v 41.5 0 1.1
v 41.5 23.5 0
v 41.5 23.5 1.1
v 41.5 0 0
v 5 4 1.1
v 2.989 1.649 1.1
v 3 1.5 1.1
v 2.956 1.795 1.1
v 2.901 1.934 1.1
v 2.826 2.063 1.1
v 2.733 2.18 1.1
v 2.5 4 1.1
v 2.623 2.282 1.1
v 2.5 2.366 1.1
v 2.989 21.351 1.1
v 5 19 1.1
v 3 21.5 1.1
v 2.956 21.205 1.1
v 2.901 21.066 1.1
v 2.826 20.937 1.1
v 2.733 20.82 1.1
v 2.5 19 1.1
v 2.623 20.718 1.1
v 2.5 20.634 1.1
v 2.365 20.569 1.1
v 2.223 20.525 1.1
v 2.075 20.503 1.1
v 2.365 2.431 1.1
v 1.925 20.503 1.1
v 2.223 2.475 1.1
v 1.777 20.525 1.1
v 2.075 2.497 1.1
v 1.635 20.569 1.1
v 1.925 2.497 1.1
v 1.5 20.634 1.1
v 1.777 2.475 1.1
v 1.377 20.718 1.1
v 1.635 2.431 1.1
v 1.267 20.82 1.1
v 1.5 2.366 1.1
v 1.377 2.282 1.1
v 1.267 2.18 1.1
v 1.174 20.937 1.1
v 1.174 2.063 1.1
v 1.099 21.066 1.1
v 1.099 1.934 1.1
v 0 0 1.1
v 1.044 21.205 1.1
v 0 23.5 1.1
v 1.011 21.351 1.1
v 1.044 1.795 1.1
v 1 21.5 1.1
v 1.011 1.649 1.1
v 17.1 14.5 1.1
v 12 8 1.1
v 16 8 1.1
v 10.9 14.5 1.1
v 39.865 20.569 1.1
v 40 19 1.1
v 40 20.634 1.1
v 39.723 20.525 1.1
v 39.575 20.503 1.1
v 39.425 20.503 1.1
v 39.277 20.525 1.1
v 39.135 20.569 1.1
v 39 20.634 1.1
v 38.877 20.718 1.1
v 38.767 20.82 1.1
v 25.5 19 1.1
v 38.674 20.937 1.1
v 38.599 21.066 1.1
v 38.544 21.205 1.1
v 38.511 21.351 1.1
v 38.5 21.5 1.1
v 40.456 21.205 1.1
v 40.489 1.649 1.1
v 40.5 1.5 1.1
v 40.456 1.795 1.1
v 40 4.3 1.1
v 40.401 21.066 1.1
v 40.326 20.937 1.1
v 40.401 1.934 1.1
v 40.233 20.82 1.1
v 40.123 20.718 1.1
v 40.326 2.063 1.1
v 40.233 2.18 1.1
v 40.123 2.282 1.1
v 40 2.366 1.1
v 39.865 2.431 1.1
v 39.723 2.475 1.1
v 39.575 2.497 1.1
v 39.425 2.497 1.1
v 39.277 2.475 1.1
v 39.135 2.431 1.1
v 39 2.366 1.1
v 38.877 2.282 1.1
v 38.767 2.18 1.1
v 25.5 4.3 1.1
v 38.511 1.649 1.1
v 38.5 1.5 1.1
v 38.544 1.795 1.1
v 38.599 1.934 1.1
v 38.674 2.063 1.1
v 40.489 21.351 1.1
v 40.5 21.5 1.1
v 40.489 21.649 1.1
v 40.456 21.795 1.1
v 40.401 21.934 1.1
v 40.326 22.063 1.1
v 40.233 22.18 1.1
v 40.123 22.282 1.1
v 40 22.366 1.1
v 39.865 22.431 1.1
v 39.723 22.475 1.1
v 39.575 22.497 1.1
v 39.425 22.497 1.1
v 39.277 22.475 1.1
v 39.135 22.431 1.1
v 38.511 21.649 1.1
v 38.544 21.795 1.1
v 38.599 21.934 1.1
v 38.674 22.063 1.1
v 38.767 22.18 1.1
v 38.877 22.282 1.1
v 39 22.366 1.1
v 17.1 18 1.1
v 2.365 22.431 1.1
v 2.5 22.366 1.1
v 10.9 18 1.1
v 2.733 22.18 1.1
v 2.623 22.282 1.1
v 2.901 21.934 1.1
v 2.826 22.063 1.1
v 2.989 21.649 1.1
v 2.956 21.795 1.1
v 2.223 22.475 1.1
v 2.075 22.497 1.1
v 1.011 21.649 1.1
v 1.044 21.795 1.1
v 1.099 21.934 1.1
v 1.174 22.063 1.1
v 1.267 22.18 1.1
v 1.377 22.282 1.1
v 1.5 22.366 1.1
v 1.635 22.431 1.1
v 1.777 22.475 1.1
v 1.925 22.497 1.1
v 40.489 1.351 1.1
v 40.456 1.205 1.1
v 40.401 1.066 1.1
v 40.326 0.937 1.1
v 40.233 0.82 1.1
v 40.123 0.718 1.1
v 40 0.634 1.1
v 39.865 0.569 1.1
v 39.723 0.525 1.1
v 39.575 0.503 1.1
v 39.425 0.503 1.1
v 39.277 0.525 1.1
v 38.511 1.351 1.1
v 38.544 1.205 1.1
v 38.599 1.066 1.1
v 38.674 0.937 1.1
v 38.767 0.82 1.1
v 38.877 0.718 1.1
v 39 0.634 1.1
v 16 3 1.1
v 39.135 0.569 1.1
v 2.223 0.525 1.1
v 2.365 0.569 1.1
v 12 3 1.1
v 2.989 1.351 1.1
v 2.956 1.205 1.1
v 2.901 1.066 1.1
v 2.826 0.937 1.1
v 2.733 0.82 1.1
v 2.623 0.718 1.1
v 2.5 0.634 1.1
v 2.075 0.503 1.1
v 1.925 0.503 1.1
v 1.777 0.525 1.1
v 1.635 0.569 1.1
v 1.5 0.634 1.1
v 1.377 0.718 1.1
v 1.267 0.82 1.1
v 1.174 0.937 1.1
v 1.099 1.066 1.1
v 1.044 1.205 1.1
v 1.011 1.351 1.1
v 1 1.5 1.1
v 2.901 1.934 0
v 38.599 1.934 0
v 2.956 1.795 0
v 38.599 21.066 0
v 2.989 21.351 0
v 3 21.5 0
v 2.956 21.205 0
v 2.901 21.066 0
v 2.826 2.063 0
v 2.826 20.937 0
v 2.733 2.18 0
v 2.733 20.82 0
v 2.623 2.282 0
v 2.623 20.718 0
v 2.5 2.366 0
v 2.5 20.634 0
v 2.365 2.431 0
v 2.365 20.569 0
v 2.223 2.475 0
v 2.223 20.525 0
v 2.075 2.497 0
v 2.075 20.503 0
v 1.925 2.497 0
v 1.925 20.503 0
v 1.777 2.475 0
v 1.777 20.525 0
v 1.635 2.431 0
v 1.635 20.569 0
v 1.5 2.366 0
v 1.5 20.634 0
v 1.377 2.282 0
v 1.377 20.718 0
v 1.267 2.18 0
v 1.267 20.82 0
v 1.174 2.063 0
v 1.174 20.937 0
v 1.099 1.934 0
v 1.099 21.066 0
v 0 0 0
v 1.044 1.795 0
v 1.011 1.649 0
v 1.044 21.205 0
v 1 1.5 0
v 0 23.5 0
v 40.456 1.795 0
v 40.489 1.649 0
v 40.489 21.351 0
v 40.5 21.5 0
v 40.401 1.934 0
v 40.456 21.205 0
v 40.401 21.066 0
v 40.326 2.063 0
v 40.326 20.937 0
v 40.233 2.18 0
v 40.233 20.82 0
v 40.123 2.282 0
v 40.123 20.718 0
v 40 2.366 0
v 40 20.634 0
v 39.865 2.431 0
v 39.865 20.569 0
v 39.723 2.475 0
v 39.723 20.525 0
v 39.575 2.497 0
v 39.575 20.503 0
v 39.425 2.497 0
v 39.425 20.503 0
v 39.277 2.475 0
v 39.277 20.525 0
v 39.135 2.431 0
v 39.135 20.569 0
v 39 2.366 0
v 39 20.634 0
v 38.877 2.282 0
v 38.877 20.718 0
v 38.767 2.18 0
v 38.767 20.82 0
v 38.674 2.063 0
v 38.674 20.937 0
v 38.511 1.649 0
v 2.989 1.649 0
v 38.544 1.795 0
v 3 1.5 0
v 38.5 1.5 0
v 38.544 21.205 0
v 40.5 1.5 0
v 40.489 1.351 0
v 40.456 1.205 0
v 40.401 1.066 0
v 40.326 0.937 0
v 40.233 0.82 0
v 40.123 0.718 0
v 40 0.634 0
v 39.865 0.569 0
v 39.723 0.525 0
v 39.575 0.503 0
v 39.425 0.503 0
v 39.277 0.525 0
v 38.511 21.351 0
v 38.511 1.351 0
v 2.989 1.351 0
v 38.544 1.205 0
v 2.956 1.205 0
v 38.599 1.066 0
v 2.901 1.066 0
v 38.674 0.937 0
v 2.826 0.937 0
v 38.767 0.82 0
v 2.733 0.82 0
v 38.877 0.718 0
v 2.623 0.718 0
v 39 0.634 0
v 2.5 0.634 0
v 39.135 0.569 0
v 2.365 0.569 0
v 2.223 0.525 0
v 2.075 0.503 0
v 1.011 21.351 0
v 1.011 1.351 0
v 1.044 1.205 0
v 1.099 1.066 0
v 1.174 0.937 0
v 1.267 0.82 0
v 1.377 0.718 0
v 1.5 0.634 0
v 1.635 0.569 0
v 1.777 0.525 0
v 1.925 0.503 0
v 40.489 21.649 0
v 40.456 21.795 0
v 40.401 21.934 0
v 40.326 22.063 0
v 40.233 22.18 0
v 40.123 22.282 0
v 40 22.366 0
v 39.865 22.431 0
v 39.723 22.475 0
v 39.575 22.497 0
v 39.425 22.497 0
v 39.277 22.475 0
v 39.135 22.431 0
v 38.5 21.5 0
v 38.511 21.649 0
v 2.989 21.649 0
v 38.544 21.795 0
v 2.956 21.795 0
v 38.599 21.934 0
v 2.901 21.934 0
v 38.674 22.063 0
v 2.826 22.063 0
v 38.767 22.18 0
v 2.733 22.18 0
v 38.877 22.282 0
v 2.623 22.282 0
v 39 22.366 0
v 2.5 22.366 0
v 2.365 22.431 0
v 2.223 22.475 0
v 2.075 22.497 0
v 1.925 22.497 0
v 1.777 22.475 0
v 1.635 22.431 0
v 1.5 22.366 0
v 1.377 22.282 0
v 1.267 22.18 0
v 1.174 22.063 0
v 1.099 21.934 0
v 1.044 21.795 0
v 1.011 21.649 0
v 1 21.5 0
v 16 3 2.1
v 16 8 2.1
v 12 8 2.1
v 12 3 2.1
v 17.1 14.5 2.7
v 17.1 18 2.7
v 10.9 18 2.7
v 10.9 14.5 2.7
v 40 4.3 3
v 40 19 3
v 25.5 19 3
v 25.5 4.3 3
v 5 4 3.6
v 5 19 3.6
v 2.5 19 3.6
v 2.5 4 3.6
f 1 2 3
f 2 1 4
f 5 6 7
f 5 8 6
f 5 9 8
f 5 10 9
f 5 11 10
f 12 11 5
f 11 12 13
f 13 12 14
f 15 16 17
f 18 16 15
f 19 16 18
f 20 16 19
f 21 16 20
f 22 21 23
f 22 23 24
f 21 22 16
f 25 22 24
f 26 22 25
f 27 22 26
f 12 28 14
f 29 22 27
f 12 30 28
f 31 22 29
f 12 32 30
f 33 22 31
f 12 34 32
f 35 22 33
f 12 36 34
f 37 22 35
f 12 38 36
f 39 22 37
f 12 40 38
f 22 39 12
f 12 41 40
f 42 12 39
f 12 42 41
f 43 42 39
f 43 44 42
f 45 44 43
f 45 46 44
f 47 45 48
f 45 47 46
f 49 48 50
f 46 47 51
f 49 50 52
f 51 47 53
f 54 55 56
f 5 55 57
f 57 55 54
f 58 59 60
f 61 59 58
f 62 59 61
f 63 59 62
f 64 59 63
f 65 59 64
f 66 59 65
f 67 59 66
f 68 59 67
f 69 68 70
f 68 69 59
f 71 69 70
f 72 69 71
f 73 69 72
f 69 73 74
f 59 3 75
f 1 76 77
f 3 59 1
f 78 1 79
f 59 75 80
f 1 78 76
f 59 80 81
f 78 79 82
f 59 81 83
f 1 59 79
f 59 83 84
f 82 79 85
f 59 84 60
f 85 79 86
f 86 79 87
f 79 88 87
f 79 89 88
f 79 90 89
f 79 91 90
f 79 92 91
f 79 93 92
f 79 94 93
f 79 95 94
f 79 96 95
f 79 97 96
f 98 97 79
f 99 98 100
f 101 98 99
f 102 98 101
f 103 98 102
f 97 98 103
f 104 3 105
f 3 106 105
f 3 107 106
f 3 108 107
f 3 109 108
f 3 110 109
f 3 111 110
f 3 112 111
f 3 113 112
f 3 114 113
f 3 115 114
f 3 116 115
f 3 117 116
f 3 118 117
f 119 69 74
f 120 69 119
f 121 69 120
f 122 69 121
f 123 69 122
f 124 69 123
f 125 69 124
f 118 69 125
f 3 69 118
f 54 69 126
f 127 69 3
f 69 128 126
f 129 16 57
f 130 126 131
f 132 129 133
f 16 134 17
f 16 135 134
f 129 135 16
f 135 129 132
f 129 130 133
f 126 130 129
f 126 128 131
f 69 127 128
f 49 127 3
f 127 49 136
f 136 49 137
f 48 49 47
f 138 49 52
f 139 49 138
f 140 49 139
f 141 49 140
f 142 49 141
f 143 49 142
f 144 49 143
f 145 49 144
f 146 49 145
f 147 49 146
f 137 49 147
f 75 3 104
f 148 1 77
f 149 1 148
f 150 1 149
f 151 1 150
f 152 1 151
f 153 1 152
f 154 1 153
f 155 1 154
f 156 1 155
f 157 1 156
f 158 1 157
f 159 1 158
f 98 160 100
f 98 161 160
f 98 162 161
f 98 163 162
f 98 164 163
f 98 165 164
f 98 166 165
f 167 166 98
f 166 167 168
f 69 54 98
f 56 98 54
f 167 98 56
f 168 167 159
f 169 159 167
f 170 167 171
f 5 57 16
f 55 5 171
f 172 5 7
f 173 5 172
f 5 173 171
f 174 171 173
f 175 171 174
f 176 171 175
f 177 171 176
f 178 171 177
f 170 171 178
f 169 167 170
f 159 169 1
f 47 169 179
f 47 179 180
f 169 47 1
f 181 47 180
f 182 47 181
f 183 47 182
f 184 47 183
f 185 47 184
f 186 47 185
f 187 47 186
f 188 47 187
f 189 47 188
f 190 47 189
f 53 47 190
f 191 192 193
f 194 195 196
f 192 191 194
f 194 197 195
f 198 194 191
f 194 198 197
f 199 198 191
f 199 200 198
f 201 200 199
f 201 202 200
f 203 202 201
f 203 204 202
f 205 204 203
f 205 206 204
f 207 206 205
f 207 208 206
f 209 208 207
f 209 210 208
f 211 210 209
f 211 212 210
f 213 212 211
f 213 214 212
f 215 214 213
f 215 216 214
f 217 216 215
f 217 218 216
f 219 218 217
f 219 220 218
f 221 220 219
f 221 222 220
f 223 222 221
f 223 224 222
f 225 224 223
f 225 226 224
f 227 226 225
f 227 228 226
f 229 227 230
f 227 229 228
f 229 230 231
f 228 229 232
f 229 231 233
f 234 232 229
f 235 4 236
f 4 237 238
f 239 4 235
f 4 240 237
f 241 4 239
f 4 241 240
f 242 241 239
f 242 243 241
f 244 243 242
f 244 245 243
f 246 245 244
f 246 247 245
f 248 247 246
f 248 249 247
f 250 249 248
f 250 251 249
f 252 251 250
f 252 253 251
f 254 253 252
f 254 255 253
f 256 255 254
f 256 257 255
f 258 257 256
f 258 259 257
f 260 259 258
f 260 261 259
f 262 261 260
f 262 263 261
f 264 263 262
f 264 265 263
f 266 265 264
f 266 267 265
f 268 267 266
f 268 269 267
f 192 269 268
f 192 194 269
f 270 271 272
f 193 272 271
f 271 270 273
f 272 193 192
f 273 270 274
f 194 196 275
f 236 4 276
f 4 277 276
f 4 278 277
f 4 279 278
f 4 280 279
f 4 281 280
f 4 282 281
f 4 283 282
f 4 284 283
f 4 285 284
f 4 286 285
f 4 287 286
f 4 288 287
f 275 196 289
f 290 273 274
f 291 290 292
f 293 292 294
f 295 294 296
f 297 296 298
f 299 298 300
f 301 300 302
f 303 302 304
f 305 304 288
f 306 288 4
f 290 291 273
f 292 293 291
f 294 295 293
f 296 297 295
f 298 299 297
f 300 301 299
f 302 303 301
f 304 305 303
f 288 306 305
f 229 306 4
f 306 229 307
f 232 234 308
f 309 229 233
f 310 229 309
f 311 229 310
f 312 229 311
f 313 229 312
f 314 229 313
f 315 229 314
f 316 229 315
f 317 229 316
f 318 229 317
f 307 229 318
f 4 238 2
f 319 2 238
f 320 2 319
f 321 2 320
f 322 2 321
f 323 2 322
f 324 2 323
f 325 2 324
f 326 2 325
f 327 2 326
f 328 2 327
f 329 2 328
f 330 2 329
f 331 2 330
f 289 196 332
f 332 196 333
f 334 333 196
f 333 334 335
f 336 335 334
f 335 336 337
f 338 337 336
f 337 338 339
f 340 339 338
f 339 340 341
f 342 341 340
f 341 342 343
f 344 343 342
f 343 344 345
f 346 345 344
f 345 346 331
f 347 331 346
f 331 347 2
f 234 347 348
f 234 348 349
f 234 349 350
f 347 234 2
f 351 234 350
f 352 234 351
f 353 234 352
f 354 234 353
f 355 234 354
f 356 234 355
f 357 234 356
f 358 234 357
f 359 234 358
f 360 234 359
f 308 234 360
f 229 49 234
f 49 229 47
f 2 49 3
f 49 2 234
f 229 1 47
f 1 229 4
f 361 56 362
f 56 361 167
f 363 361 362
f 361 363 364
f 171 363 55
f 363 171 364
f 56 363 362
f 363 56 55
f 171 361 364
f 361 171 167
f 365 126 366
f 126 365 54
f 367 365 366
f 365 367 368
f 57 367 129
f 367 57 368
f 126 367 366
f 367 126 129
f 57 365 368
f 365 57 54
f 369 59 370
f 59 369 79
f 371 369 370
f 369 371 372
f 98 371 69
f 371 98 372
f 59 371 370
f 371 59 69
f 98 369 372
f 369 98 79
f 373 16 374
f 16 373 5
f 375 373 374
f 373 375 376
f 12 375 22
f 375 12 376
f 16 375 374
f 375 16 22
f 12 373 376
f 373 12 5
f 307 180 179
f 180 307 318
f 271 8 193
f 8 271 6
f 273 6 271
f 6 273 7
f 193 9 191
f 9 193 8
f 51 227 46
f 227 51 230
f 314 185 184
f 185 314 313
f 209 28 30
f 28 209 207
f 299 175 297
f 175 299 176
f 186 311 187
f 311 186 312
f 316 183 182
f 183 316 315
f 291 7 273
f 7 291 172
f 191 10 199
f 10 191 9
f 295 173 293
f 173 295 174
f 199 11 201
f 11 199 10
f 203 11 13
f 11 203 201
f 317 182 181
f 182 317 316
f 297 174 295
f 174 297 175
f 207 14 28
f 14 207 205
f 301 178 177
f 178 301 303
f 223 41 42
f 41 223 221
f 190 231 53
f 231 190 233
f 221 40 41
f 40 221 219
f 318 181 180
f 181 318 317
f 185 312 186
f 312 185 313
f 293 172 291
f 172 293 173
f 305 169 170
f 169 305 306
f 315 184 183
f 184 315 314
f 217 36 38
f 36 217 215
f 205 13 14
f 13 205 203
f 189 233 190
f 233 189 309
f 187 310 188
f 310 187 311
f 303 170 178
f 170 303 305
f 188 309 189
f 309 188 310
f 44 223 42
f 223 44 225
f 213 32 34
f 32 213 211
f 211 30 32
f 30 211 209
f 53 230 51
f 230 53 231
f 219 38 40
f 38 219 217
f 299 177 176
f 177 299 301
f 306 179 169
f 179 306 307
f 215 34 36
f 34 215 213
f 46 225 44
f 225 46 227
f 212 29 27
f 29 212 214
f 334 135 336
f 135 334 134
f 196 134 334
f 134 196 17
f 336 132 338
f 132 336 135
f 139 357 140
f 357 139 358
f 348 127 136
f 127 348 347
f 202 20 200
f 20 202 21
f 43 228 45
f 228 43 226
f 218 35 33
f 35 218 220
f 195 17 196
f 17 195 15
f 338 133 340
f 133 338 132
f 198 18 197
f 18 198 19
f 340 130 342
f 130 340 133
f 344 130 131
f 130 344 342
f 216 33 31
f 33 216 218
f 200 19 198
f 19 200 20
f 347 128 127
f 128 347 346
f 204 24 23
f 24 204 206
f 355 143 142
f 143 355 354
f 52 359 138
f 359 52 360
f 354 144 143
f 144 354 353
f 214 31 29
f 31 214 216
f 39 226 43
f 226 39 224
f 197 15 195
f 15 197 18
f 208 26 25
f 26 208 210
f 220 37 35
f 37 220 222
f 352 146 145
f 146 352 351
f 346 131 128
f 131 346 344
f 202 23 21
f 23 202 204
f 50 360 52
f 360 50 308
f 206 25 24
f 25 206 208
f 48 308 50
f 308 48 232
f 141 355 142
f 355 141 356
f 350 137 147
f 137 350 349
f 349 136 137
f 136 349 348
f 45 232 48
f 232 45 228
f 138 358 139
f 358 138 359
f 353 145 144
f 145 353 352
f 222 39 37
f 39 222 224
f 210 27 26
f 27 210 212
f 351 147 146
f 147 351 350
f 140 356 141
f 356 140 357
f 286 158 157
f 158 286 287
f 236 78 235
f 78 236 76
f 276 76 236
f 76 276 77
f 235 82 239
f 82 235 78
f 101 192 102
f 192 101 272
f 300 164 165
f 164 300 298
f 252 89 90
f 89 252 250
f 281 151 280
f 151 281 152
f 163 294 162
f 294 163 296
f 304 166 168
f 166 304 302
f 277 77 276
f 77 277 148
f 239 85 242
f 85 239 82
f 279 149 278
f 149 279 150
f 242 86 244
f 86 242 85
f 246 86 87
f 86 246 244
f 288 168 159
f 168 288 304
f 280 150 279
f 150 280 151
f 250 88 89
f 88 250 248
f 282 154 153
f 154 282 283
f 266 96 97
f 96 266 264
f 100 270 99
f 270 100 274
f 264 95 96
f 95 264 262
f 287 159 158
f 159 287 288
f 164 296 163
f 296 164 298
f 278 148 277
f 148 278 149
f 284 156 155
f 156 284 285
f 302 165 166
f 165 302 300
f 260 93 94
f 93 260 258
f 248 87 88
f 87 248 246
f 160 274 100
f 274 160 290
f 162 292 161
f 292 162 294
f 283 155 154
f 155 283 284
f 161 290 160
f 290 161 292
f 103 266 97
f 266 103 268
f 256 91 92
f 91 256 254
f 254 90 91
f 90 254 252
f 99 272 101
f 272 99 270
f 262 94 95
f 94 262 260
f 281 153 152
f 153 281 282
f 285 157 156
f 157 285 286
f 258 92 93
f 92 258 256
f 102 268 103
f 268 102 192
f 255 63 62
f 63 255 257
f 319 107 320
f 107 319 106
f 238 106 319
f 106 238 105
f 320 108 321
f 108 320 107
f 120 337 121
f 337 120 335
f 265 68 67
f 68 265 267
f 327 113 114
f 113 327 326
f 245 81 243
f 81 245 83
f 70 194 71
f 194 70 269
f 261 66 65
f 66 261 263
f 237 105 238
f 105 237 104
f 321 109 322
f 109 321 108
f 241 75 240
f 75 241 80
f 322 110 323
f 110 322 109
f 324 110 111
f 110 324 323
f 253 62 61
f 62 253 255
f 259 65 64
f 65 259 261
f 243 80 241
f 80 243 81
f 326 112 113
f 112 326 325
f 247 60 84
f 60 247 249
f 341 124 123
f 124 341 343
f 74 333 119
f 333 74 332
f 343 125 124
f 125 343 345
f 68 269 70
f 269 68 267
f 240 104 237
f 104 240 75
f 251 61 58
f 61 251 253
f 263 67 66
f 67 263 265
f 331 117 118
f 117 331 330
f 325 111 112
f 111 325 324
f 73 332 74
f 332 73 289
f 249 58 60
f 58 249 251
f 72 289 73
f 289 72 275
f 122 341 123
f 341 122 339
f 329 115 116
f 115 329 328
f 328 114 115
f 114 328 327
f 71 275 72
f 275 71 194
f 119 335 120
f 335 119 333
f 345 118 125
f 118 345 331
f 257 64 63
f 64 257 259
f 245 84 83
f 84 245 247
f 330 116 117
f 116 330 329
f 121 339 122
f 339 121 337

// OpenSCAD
$fn = 42;

difference(){
	union() {
		union() {
			union() {
				union() {
					union() {
						union() {
							union() {
								union() {
									cube(size = [41.5000000000, 23.5000000000, 1.1000000000]);
									translate(v = [2, 0, 0]) {
										translate(v = [0, 1.5000000000, 0]) {
											translate(v = [0, 0, -20]) {
											}
										}
									}
								}
								translate(v = [2, 0, 0]) {
									translate(v = [0, 21.5000000000, 0]) {
										translate(v = [0, 0, -20]) {
										}
									}
								}
							}
							translate(v = [39.5000000000, 0, 0]) {
								translate(v = [0, 1.5000000000, 0]) {
									translate(v = [0, 0, -20]) {
									}
								}
							}
						}
						translate(v = [39.5000000000, 0, 0]) {
							translate(v = [0, 21.5000000000, 0]) {
								translate(v = [0, 0, -20]) {
								}
							}
						}
					}
					translate(v = [0, 3, 0]) {
						translate(v = [12, 0, 0]) {
							translate(v = [0, 0, 1.1000000000]) {
								cube(size = [4, 5, 1]);
							}
						}
					}
				}
				translate(v = [0, 14.5000000000, 0]) {
					translate(v = [10.9000000000, 0, 0]) {
						translate(v = [0, 0, 1.1000000000]) {
							cube(size = [6.2000000000, 3.5000000000, 1.6000000000]);
						}
					}
				}
			}
			translate(v = [0, 0, 1.1000000000]) {
				translate(v = [0, 4.3000000000, 0]) {
					translate(v = [25.5000000000, 0, 0]) {
						cube(size = [14.5000000000, 14.7000000000, 1.9000000000]);
					}
				}
			}
		}
		translate(v = [0, 4, 0]) {
			translate(v = [2.5000000000, 0, 0]) {
				translate(v = [0, 0, 1.1000000000]) {
					cube(size = [2.5000000000, 15, 2.5000000000]);
				}
			}
		}
	}
	/* Holes Below*/
	union(){
		union(){
			union(){
				union(){
					union(){
						union(){
							union(){
								union(){
									translate(v = [2, 0, 0]){
										translate(v = [0, 1.5000000000, 0]){
											translate(v = [0, 0, -20]){
												cylinder(d = 2, h = 50);
											}
										}
									}
								}
								translate(v = [2, 0, 0]){
									translate(v = [0, 21.5000000000, 0]){
										translate(v = [0, 0, -20]){
											cylinder(d = 2, h = 50);
										}
									}
								}
							}
							translate(v = [39.5000000000, 0, 0]){
								translate(v = [0, 1.5000000000, 0]){
									translate(v = [0, 0, -20]){
										cylinder(d = 2, h = 50);
									}
								}
							}
						}
						translate(v = [39.5000000000, 0, 0]){
							translate(v = [0, 21.5000000000, 0]){
								translate(v = [0, 0, -20]){
									cylinder(d = 2, h = 50);
								}
							}
						}
					}
				}
			}
		}
	} /* End Holes */ 
}
/***********************************************
*********      SolidPython code:      **********
************************************************
 
from os.path import join
from solid.utils import *

SEGMENTS = 42
HAS_PINS = True
PINS_BACKSIDE = False


def assemble():
    print "assembling"
    base = cube([41.5, 23.5, 1.1])

    print "punching holes"
    _cylinder_hole = down(20)(hole()(cylinder(d=2, h=50)))
    base += right(2)(forward(1.5)(_cylinder_hole))
    base += right(2)(forward(21.5)(_cylinder_hole))
    base += right(39.5)(forward(1.5)(_cylinder_hole))
    base += right(39.5)(forward(21.5)(_cylinder_hole))

    print "attaching chips"
    _cube_chip1 = forward(3)(right(12)(up(1.1)(cube([4, 5, 1]))))
    _cube_chip2 = forward(14.5)(right(10.9)(up(1.1)(cube([6.2, 3.5, 1.6]))))
    base += _cube_chip1
    base += _cube_chip2

    print "attaching microsd slot"
    _cube_slot = cube([14.5, 14.7, 1.9])
    base += up(1.1)(forward(4.3)(right(25.5)(_cube_slot)))

    if HAS_PINS:
        print "attaching pins"
        _cube_pins = cube([2.5, 15, 2.5])
        if PINS_BACKSIDE:
            _cube_pins = down(2.5)(_cube_pins)
        else:
            _cube_pins = up(1.1)(_cube_pins)
        base += forward(4)(right(2.5)(_cube_pins))

    return base


if __name__ == '__main__':
    scad_render_to_file(assemble(), join('./out/', "catalex_microsd.scad"), file_header='$fn = %s;' % SEGMENTS)
 
 
************************************************/
